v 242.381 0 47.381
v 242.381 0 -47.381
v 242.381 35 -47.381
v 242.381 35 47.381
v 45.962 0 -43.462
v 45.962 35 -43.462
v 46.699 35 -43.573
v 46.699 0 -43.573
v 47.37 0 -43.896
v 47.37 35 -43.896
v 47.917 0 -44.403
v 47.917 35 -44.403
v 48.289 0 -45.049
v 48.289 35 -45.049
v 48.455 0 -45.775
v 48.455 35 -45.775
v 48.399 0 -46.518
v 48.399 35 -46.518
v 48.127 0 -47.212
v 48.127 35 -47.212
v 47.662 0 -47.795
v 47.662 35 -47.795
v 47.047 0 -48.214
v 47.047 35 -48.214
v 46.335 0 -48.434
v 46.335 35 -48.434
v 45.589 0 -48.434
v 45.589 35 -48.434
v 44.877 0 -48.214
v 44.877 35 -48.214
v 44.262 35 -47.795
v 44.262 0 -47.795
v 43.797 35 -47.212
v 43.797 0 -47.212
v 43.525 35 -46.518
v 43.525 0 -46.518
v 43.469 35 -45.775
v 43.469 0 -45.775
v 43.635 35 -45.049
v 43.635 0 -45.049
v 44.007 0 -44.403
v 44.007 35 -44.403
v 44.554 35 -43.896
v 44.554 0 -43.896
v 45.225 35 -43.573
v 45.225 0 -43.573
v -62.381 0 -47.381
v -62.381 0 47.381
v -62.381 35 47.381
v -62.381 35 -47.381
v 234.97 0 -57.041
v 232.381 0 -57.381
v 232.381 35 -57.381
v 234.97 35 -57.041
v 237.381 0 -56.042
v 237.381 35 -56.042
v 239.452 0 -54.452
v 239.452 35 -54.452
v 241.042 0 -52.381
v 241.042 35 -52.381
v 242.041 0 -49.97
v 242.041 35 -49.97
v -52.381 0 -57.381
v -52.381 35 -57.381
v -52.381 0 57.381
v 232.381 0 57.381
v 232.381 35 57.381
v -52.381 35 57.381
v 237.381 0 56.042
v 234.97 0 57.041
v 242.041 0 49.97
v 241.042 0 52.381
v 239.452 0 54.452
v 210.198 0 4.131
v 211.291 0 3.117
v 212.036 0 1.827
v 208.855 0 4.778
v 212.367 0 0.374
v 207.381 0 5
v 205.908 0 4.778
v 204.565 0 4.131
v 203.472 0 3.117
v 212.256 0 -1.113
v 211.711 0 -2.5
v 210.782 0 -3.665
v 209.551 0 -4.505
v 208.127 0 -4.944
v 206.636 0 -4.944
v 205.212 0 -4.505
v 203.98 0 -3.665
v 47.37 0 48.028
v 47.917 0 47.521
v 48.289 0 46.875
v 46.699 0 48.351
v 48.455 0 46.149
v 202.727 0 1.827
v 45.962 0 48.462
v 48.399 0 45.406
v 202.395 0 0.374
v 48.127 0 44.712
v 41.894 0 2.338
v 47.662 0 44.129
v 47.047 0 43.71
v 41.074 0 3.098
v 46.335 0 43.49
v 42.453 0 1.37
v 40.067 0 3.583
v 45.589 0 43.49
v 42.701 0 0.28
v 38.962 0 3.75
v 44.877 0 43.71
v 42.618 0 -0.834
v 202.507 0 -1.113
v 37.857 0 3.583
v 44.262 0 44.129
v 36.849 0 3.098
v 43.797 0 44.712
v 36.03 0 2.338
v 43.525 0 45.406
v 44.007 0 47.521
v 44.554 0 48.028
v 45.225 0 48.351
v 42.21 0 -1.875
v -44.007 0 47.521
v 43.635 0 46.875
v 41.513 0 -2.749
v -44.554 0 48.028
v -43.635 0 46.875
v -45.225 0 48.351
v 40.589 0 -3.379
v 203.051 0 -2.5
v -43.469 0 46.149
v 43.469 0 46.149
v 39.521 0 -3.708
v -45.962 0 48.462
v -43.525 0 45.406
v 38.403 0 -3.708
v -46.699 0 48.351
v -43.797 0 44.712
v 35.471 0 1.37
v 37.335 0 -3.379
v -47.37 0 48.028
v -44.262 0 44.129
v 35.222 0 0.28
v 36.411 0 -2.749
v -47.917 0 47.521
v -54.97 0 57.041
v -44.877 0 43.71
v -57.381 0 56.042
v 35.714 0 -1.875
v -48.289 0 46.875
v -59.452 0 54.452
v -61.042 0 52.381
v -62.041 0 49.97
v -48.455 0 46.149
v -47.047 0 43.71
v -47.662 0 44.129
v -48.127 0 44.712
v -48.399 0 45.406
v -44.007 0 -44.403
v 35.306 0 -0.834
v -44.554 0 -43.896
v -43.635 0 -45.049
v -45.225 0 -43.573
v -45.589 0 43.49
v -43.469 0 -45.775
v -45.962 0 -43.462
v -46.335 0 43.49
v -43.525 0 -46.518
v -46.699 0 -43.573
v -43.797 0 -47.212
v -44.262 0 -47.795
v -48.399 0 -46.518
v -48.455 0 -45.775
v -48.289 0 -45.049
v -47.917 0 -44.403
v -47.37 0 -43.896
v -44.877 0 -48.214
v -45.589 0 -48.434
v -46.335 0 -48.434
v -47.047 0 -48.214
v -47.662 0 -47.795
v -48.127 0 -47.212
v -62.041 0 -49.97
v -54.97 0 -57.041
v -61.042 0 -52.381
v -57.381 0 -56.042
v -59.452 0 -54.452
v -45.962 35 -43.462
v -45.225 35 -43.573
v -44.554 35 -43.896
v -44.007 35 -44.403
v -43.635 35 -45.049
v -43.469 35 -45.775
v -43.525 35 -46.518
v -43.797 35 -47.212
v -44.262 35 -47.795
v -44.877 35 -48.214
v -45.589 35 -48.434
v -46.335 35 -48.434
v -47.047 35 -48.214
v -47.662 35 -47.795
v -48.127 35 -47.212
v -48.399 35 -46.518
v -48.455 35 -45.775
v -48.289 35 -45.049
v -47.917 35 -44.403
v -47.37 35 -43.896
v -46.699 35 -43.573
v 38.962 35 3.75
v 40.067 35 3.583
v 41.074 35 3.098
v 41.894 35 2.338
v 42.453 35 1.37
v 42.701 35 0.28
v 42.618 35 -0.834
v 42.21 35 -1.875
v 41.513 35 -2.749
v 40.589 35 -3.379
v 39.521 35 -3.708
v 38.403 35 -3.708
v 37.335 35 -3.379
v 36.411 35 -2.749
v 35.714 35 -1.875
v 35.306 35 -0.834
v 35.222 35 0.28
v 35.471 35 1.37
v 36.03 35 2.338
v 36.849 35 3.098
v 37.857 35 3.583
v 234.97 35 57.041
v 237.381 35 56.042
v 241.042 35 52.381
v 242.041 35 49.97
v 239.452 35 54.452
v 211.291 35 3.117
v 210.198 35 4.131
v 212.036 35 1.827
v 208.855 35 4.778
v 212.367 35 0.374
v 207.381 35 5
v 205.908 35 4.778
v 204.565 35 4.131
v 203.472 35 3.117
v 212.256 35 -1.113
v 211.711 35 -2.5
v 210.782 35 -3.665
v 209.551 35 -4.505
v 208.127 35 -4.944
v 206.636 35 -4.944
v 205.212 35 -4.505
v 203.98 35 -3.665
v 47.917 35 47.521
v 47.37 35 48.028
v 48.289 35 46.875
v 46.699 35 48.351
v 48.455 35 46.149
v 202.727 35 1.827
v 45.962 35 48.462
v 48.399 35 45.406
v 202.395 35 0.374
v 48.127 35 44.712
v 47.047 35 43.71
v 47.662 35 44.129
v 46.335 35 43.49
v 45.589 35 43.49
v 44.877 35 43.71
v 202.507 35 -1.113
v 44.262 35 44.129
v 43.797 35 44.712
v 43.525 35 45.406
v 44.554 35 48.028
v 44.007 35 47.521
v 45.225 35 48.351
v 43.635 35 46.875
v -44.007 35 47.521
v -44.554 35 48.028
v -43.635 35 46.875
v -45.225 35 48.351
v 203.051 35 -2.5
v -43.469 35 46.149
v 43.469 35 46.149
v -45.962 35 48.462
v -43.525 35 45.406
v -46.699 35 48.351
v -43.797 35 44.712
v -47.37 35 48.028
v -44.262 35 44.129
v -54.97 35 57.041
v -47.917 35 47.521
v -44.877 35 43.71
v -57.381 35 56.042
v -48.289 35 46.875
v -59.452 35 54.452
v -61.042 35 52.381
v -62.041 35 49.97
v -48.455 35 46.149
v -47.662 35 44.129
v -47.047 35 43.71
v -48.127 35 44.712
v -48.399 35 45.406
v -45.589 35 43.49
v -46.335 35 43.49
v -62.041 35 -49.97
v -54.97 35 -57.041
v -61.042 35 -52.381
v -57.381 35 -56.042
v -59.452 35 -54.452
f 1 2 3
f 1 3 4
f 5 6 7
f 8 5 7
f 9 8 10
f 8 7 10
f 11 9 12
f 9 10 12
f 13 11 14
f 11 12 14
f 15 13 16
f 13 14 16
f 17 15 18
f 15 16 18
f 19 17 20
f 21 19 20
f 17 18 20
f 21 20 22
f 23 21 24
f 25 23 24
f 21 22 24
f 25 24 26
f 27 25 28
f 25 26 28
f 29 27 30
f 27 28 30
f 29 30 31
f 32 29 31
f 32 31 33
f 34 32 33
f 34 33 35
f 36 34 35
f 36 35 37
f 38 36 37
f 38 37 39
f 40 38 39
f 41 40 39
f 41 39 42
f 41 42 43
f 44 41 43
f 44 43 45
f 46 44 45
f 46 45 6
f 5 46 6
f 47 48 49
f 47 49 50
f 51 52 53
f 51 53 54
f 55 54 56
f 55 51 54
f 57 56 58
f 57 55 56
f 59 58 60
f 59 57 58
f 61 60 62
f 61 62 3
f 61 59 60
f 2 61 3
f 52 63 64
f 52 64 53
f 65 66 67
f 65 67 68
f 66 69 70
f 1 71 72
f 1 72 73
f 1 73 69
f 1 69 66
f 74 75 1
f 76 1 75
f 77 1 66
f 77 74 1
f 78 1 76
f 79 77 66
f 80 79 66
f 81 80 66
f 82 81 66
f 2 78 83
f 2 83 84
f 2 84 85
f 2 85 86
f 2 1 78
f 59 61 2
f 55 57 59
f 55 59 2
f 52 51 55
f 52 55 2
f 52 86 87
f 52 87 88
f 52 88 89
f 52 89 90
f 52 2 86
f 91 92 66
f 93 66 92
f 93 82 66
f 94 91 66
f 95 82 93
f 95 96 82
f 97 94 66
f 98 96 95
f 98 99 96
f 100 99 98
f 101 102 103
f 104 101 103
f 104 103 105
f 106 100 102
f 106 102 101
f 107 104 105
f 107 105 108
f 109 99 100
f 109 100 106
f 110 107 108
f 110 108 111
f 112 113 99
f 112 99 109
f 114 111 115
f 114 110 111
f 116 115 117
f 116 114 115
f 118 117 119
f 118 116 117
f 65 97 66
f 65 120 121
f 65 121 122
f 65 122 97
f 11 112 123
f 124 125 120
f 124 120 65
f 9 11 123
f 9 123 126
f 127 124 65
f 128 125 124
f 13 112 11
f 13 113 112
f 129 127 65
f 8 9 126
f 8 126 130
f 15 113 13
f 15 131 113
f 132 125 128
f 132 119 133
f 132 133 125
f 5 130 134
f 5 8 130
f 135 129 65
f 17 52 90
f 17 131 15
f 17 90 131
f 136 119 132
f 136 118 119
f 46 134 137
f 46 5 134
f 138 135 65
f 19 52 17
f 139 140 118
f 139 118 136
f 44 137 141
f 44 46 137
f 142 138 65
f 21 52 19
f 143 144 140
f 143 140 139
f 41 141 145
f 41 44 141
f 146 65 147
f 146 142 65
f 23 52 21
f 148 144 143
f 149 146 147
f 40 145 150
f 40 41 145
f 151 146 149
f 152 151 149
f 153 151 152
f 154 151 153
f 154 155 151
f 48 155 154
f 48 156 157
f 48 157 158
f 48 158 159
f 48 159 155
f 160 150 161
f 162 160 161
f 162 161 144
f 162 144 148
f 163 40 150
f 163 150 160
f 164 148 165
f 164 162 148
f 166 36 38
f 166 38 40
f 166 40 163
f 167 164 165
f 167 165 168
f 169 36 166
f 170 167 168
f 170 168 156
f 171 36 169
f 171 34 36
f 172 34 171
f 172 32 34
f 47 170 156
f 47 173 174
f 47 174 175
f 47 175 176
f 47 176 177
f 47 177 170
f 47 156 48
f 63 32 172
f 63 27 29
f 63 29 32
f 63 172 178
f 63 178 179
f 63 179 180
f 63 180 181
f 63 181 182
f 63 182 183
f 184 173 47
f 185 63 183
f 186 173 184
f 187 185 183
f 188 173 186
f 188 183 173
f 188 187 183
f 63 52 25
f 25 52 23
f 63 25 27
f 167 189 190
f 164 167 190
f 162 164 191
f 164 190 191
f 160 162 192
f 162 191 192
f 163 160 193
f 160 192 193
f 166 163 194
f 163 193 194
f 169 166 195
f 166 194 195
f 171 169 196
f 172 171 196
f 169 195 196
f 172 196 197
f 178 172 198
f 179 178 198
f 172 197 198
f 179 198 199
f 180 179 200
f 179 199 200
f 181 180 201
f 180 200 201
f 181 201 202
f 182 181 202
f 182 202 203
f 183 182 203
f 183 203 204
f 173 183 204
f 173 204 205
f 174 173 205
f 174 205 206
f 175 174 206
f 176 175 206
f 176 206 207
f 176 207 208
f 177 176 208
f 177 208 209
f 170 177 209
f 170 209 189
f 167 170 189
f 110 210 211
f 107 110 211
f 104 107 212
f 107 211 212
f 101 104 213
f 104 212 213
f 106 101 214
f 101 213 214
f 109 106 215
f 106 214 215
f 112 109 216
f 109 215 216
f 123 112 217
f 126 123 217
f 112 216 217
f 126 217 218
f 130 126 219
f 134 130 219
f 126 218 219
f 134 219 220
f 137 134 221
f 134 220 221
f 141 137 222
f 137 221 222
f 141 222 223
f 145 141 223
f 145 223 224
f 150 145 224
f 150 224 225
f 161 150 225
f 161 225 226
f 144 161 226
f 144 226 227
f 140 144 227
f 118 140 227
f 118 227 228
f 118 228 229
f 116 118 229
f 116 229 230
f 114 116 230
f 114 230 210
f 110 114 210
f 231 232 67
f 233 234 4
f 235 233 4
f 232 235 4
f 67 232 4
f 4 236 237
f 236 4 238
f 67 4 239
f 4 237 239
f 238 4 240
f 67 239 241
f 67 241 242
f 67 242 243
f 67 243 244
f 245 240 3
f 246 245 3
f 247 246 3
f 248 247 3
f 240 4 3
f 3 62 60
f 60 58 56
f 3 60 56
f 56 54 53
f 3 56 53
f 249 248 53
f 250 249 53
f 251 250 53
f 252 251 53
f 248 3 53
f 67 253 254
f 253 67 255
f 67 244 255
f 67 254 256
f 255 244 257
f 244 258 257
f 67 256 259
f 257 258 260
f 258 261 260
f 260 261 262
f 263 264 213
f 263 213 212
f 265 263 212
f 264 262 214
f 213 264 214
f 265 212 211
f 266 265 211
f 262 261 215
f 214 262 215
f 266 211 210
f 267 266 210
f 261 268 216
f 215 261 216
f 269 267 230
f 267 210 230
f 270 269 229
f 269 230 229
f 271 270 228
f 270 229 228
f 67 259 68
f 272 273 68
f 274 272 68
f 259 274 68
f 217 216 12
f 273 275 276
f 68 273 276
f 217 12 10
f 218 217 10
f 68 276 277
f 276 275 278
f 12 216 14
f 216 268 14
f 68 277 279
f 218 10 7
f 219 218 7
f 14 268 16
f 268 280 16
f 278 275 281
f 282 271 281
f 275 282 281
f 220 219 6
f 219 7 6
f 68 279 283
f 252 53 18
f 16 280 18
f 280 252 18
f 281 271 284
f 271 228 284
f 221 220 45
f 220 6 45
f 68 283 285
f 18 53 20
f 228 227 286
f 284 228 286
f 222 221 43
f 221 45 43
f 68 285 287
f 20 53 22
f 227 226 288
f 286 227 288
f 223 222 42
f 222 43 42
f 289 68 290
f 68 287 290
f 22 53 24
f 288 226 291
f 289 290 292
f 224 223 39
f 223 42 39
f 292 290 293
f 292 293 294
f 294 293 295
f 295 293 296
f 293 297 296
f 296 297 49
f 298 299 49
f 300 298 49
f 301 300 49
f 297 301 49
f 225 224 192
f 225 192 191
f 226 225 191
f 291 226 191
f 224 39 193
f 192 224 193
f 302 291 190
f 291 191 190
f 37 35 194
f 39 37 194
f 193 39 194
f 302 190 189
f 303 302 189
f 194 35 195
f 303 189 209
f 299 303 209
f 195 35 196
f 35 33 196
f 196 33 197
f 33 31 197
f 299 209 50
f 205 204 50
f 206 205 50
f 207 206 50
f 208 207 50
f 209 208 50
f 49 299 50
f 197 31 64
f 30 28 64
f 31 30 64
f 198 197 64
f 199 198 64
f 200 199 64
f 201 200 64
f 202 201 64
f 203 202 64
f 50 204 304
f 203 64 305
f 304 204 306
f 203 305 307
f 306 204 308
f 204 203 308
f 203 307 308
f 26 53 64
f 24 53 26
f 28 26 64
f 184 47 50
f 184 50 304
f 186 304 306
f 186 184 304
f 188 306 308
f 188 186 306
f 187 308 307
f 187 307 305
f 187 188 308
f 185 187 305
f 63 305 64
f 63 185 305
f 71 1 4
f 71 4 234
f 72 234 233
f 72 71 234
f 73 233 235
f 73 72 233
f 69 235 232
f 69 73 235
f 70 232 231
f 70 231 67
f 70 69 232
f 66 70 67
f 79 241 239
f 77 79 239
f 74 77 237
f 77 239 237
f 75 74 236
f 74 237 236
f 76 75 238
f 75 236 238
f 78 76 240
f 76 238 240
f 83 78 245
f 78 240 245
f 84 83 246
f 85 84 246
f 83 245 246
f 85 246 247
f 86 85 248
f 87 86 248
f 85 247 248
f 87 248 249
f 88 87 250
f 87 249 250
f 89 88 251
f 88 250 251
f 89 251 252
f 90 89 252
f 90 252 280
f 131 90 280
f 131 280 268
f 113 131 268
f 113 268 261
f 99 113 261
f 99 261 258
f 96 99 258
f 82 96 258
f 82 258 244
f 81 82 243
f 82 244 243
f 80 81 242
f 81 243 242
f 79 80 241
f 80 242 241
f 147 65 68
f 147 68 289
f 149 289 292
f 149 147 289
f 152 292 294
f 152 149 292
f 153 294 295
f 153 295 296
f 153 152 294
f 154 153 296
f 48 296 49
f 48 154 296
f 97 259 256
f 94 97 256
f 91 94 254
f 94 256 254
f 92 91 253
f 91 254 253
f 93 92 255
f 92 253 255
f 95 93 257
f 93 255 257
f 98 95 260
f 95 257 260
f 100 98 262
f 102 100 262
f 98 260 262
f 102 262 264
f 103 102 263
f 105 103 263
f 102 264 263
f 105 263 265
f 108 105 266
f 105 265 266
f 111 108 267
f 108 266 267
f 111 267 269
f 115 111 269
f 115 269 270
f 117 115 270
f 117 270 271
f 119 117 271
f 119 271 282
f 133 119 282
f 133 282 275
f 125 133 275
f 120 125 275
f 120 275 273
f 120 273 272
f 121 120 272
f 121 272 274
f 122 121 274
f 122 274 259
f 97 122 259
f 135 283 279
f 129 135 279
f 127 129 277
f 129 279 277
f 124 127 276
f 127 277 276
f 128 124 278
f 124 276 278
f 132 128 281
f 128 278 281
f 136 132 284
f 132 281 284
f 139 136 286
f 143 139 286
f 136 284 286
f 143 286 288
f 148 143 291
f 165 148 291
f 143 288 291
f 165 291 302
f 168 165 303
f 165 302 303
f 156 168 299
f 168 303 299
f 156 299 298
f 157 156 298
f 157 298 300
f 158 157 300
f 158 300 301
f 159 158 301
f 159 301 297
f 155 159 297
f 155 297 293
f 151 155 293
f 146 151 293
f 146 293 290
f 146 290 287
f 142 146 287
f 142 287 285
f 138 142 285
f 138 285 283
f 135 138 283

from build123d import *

# Parameters (mm, degrees)
BOSS_EXTRUDE1_DEPTH = 35
SKETCH2_R           = 5
CUT_EXTRUDE1_DEPTH  = 35
SKETCH3_R           = 2.5
SKETCH3_R_2         = 3.75
CUT_EXTRUDE2_DEPTH  = 252.528008709


with BuildPart() as part:
    # Sketch1 → Boss-Extrude1 (new body)
    with BuildSketch(Plane(origin=(0, 0, 0), x_dir=(1, 0, 0), z_dir=(0, 1, 0))):
        with BuildLine():
            Line((-52.381351684, 57.381351684), (62.381351684, 57.381351684))
            Line((62.381351684, 57.381351684), (232.381351684, 57.381351684))
            ThreePointArc((232.381351684, 57.381351684), (239.452419496, 54.452419496), (242.381351684, 47.381351684))
            Line((242.381351684, 47.381351684), (242.381351684, -47.381351684))
            ThreePointArc((242.381351684, -47.381351684), (239.452419496, -54.452419496), (232.381351684, -57.381351684))
            Line((232.381351684, -57.381351684), (62.381351684, -57.381351684))
            Line((62.381351684, -57.381351684), (-52.381351684, -57.381351684))
            ThreePointArc((-52.381351684, -57.381351684), (-59.452419496, -54.452419496), (-62.381351684, -47.381351684))
            Line((-62.381351684, -47.381351684), (-62.381351684, 47.381351684))
            ThreePointArc((-62.381351684, 47.381351684), (-59.452419496, 54.452419496), (-52.381351684, 57.381351684))
        make_face()
    extrude(amount=BOSS_EXTRUDE1_DEPTH)

    # Sketch2 → Cut-Extrude1 (cut)
    with BuildSketch(Plane(origin=(0, 35, 0), x_dir=(1, 0, 0), z_dir=(0, 1, 0))):
        with Locations(Location((207.381351684, 0, 0), (0, 0, 270))):
            Circle(SKETCH2_R)
    extrude(amount=-CUT_EXTRUDE1_DEPTH, mode=Mode.SUBTRACT)

    # Sketch3 → Cut-Extrude2 (cut, through all)
    with BuildSketch(Plane(origin=(0, 35, 0), x_dir=(1, 0, 0), z_dir=(0, 1, 0))):
        with Locations(Location((45.961940777, 45.961940777, 0), (0, 0, 270))):
            Circle(SKETCH3_R)
        with Locations(Location((45.961940777, -45.961940777, 0), (0, 0, 270))):
            Circle(SKETCH3_R)
        with Locations(Location((-45.961940777, -45.961940777, 0), (0, 0, 270))):
            Circle(SKETCH3_R)
        with Locations(Location((-45.961940777, 45.961940777, 0), (0, 0, 270))):
            Circle(SKETCH3_R)
        with Locations(Location((38.961940777, 0, 0), (0, 0, 270))):
            Circle(SKETCH3_R_2)
    extrude(amount=-CUT_EXTRUDE2_DEPTH, mode=Mode.SUBTRACT)


solid = part.part
